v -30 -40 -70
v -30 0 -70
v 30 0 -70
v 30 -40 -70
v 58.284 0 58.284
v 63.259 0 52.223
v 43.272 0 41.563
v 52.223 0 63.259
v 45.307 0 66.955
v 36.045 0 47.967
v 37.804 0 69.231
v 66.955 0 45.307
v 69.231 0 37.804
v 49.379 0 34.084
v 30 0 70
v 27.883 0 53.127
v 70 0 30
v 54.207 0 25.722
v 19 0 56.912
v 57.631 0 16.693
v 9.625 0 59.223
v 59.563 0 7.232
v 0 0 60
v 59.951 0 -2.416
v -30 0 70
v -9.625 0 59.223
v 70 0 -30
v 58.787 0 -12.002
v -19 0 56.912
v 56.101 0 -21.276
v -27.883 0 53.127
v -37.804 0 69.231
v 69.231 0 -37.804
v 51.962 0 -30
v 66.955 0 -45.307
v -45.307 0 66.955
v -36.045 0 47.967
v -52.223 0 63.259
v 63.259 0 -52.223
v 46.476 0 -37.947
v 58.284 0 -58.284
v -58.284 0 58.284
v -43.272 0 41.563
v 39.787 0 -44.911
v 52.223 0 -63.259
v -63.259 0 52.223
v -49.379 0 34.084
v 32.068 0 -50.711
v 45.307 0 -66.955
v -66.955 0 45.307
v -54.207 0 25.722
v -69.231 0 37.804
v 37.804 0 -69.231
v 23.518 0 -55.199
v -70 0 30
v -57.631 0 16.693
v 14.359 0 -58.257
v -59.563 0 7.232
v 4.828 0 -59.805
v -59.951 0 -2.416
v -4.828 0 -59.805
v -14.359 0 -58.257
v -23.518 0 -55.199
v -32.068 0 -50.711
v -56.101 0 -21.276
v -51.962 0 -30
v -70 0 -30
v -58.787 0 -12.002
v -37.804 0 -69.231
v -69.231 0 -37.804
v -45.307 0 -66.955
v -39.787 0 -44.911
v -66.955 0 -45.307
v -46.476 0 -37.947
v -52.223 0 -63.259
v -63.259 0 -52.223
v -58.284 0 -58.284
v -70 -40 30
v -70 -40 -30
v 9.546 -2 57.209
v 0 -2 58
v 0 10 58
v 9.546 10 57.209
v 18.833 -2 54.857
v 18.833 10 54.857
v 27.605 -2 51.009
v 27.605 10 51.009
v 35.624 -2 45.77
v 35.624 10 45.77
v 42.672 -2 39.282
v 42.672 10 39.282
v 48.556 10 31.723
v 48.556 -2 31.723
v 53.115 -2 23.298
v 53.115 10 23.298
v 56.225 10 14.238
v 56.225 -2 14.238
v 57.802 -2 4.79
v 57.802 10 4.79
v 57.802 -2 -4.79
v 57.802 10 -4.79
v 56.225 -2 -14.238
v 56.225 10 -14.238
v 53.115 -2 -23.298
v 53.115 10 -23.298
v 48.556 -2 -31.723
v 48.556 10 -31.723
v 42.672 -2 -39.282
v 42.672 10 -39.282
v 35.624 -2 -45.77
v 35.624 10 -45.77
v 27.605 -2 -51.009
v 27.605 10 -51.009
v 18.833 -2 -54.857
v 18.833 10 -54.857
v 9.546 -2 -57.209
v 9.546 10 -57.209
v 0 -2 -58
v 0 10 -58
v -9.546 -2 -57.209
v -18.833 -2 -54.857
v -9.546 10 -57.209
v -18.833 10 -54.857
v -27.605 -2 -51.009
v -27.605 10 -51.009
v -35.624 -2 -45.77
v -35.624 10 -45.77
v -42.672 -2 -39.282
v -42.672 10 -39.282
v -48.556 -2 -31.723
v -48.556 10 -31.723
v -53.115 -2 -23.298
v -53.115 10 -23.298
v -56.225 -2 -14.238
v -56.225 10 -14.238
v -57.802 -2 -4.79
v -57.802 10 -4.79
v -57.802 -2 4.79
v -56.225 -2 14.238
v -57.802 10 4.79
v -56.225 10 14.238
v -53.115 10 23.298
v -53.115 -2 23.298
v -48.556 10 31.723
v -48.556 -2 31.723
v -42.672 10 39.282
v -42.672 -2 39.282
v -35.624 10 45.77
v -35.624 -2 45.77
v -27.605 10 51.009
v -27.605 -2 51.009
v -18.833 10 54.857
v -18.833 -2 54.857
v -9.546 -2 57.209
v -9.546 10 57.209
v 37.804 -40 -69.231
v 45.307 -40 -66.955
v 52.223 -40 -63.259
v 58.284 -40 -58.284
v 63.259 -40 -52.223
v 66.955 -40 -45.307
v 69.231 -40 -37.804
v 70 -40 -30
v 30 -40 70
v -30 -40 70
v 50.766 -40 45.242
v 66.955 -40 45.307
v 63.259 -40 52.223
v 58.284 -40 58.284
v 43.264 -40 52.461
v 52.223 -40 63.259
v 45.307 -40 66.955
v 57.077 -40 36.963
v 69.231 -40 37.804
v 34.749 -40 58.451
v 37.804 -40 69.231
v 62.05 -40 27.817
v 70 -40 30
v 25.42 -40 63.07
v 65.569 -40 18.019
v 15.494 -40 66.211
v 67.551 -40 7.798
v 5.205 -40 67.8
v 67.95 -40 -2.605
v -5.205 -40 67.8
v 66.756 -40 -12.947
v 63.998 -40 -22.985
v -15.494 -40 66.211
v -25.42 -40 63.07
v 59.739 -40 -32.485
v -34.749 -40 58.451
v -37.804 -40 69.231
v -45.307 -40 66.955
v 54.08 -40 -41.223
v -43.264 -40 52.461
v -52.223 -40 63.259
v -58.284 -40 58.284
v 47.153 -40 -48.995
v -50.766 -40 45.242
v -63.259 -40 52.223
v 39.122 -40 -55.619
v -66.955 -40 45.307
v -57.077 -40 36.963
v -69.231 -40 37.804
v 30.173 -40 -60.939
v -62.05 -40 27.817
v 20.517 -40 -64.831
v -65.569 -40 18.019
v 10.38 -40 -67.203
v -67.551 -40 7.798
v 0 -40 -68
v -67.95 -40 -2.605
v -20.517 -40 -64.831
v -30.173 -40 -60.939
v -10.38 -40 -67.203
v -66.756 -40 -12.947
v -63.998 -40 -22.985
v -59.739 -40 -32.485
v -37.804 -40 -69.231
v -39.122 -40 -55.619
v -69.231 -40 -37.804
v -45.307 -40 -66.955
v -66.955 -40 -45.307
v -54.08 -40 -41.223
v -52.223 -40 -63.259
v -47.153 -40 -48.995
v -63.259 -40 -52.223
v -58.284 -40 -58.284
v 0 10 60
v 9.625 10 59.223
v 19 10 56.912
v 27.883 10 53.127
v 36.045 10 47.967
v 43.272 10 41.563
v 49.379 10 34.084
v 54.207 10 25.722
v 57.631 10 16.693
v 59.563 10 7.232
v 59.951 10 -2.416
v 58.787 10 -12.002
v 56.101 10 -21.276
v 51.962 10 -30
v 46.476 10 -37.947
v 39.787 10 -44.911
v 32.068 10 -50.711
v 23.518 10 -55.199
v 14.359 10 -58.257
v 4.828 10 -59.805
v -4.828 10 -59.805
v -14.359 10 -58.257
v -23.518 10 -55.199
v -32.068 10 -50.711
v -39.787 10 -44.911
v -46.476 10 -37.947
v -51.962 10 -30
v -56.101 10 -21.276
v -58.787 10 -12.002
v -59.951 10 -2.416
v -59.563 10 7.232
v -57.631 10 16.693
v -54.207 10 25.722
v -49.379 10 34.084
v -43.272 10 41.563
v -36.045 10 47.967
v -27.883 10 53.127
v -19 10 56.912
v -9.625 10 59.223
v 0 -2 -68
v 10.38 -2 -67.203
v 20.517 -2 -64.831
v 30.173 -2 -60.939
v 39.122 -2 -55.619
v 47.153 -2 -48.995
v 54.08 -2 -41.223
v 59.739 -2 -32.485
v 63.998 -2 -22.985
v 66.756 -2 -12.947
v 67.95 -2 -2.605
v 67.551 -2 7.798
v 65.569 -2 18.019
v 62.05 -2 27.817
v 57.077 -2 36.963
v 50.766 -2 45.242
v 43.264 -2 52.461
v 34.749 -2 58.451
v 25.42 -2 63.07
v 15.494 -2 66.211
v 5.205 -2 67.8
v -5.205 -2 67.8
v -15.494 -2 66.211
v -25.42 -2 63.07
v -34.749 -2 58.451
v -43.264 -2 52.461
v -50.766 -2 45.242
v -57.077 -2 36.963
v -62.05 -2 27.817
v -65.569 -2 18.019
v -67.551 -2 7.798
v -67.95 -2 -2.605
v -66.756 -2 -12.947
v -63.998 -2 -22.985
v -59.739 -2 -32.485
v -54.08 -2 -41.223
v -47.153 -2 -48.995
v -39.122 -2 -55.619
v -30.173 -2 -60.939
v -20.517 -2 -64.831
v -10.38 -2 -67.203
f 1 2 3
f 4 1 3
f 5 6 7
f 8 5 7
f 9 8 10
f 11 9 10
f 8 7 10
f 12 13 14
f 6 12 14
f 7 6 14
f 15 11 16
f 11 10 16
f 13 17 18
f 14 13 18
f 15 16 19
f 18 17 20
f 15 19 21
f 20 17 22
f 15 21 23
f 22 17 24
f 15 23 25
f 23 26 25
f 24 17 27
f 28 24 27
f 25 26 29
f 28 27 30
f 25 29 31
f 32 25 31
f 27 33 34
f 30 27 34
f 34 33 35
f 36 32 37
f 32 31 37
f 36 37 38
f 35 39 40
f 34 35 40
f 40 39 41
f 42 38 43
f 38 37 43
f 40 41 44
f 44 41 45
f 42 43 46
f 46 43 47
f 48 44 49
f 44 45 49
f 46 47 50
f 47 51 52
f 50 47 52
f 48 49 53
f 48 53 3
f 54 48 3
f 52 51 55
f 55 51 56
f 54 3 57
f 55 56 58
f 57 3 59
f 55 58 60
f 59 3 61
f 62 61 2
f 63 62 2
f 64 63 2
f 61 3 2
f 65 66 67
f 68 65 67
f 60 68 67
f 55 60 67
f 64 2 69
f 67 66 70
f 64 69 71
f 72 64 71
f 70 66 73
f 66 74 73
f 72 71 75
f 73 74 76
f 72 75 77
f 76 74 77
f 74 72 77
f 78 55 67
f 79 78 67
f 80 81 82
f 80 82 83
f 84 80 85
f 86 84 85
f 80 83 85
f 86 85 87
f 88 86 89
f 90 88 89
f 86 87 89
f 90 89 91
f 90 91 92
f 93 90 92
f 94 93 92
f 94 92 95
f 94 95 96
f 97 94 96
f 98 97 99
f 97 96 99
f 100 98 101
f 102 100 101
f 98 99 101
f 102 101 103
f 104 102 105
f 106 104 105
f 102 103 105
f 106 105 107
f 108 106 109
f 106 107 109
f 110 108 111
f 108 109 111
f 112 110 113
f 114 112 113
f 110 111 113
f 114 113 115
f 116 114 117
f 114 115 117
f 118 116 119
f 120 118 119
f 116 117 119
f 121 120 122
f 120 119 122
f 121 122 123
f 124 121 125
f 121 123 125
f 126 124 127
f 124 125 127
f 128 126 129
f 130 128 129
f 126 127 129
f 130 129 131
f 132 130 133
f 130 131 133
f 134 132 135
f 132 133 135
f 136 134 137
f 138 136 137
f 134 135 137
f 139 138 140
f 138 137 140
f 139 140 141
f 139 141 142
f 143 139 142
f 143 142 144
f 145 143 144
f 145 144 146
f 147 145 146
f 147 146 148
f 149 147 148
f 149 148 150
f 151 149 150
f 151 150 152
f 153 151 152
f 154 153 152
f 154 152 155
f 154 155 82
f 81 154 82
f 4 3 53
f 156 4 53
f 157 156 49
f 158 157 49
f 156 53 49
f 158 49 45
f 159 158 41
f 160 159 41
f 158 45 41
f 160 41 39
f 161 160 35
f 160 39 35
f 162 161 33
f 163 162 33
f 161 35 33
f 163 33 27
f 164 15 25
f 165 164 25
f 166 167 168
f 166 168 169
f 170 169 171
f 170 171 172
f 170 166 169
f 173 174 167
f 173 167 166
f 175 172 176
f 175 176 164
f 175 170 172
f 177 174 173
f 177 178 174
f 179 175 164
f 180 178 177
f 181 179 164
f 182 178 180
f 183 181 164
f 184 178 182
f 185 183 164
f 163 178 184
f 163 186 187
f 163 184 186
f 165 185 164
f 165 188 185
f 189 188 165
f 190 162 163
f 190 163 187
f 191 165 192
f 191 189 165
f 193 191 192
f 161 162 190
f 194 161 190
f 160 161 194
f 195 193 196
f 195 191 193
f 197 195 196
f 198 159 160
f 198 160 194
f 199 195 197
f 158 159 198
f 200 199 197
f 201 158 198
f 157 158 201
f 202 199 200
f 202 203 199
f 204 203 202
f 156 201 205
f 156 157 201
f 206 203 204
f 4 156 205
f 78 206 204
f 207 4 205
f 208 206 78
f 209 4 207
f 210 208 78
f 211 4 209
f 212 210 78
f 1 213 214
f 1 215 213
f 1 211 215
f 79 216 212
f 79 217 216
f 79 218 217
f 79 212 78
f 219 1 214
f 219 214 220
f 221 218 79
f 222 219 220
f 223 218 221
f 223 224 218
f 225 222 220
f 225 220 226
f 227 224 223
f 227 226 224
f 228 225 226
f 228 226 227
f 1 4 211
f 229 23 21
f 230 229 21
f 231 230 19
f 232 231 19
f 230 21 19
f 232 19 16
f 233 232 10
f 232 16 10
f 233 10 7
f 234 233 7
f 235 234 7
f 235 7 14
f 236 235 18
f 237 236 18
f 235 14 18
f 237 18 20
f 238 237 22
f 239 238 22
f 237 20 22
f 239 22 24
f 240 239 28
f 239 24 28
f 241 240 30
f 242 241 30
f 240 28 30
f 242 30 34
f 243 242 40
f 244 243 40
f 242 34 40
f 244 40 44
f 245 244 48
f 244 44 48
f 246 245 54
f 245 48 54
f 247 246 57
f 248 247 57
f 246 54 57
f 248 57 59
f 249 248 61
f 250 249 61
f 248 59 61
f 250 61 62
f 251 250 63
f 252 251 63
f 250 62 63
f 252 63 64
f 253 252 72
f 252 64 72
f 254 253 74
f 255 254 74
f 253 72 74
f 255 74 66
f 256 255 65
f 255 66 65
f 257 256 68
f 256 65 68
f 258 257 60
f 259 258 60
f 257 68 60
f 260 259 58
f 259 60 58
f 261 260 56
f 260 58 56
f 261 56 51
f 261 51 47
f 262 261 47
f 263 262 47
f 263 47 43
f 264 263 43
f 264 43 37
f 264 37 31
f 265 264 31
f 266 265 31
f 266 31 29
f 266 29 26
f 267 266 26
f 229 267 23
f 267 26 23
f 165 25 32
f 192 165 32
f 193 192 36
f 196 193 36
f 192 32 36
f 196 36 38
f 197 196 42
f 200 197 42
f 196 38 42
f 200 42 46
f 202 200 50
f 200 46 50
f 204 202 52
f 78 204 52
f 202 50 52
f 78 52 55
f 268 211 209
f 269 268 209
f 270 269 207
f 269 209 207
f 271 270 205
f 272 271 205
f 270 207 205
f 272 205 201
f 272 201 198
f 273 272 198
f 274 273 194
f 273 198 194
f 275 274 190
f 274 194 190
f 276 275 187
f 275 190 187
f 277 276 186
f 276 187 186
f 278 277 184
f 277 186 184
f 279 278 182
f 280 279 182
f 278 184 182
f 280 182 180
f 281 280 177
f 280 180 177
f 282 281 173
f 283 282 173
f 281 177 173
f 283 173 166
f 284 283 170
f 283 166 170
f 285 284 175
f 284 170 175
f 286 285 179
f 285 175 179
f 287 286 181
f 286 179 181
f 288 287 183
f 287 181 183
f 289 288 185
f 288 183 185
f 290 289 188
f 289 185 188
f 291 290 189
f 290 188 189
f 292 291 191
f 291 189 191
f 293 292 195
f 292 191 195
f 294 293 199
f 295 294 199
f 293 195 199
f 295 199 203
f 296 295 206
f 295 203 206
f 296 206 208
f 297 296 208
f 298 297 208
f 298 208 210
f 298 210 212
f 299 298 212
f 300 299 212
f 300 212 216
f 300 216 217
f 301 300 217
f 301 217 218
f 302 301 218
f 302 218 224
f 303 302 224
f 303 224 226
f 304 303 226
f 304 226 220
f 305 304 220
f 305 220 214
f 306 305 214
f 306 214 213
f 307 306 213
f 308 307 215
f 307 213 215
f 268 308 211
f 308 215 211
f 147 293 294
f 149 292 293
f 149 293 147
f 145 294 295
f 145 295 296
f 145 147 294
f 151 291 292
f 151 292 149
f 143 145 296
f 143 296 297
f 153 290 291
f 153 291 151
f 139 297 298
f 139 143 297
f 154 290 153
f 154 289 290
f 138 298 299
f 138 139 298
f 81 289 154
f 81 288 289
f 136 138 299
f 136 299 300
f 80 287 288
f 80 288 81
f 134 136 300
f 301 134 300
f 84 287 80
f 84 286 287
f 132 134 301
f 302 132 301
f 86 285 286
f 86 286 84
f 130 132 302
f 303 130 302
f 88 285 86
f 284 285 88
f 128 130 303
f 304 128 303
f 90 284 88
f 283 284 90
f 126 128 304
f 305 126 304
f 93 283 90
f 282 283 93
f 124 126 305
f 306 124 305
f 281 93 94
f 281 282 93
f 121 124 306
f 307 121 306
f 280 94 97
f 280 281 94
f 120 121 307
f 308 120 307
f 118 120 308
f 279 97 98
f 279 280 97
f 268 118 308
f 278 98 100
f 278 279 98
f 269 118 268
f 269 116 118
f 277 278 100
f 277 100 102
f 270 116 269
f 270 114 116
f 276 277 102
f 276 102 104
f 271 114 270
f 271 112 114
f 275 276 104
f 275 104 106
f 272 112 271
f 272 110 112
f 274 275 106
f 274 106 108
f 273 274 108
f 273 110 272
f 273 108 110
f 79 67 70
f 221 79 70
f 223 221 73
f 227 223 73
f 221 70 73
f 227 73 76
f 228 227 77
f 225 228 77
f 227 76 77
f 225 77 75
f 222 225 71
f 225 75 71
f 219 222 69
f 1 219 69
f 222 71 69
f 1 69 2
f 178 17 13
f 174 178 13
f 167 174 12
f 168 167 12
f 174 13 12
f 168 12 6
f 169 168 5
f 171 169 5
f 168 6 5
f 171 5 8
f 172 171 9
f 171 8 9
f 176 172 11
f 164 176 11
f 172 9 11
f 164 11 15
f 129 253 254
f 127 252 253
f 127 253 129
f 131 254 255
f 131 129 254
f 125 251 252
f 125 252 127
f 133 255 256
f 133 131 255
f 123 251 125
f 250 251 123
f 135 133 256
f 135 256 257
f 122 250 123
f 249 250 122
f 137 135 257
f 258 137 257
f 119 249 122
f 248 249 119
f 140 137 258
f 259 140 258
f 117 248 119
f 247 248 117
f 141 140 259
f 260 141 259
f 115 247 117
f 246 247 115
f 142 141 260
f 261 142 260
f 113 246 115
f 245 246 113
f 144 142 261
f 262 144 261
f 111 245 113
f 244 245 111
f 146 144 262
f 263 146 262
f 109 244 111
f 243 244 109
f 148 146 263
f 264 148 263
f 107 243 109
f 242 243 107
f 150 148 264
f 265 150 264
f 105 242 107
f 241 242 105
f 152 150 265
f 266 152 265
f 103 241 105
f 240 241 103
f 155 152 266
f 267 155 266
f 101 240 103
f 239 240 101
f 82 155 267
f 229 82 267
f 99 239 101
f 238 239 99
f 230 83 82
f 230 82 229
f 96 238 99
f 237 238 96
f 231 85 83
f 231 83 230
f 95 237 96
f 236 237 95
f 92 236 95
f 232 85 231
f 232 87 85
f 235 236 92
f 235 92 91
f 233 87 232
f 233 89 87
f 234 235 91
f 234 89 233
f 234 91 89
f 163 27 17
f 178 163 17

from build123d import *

# Parameters (mm, degrees)
BOSS_EXTRUDE1_DEPTH = 40
SKETCH2_R           = 60
BOSS_EXTRUDE2_DEPTH = 10
SKETCH3_R           = 58
CUT_EXTRUDE1_DEPTH  = 12
SKETCH5_R           = 68
CUT_EXTRUDE3_DEPTH  = 38


with BuildPart() as part:
    # Sketch1 → Boss-Extrude1 (new body)
    with BuildSketch(Plane(origin=(0, 0, 0), x_dir=(1, 0, 0), z_dir=(0, 1, 0))):
        with BuildLine():
            Line((-30, 70), (30, 70))
            ThreePointArc((30, 70), (58.284271247, 58.284271247), (70, 30))
            Line((70, 30), (70, -30))
            ThreePointArc((70, -30), (58.284271247, -58.284271247), (30, -70))
            Line((30, -70), (-30, -70))
            ThreePointArc((-30, -70), (-58.284271247, -58.284271247), (-70, -30))
            Line((-70, -30), (-70, 30))
            ThreePointArc((-70, 30), (-58.284271247, 58.284271247), (-30, 70))
        make_face()
    extrude(amount=-BOSS_EXTRUDE1_DEPTH)

    # Sketch2 → Boss-Extrude2 (add)
    with BuildSketch(Plane(origin=(0, 0, 0), x_dir=(1, 0, 0), z_dir=(0, 1, 0))):
        with Locations(Location((0, 0, 0), (0, 0, 270))):
            Circle(SKETCH2_R)
    extrude(amount=BOSS_EXTRUDE2_DEPTH)

    # Sketch3 → Cut-Extrude1 (cut)
    with BuildSketch(Plane(origin=(0, 10, 0), x_dir=(1, 0, 0), z_dir=(0, 1, 0))):
        with Locations(Location((0, 0, 0), (0, 0, 270))):
            Circle(SKETCH3_R)
    extrude(amount=-CUT_EXTRUDE1_DEPTH, mode=Mode.SUBTRACT)

    # Sketch5 → Cut-Extrude3 (cut)
    with BuildSketch(Plane.XZ.offset(40)):
        with Locations(Location((0, 0, 0), (0, 0, 270))):
            Circle(SKETCH5_R)
    extrude(amount=-CUT_EXTRUDE3_DEPTH, mode=Mode.SUBTRACT)


solid = part.part
